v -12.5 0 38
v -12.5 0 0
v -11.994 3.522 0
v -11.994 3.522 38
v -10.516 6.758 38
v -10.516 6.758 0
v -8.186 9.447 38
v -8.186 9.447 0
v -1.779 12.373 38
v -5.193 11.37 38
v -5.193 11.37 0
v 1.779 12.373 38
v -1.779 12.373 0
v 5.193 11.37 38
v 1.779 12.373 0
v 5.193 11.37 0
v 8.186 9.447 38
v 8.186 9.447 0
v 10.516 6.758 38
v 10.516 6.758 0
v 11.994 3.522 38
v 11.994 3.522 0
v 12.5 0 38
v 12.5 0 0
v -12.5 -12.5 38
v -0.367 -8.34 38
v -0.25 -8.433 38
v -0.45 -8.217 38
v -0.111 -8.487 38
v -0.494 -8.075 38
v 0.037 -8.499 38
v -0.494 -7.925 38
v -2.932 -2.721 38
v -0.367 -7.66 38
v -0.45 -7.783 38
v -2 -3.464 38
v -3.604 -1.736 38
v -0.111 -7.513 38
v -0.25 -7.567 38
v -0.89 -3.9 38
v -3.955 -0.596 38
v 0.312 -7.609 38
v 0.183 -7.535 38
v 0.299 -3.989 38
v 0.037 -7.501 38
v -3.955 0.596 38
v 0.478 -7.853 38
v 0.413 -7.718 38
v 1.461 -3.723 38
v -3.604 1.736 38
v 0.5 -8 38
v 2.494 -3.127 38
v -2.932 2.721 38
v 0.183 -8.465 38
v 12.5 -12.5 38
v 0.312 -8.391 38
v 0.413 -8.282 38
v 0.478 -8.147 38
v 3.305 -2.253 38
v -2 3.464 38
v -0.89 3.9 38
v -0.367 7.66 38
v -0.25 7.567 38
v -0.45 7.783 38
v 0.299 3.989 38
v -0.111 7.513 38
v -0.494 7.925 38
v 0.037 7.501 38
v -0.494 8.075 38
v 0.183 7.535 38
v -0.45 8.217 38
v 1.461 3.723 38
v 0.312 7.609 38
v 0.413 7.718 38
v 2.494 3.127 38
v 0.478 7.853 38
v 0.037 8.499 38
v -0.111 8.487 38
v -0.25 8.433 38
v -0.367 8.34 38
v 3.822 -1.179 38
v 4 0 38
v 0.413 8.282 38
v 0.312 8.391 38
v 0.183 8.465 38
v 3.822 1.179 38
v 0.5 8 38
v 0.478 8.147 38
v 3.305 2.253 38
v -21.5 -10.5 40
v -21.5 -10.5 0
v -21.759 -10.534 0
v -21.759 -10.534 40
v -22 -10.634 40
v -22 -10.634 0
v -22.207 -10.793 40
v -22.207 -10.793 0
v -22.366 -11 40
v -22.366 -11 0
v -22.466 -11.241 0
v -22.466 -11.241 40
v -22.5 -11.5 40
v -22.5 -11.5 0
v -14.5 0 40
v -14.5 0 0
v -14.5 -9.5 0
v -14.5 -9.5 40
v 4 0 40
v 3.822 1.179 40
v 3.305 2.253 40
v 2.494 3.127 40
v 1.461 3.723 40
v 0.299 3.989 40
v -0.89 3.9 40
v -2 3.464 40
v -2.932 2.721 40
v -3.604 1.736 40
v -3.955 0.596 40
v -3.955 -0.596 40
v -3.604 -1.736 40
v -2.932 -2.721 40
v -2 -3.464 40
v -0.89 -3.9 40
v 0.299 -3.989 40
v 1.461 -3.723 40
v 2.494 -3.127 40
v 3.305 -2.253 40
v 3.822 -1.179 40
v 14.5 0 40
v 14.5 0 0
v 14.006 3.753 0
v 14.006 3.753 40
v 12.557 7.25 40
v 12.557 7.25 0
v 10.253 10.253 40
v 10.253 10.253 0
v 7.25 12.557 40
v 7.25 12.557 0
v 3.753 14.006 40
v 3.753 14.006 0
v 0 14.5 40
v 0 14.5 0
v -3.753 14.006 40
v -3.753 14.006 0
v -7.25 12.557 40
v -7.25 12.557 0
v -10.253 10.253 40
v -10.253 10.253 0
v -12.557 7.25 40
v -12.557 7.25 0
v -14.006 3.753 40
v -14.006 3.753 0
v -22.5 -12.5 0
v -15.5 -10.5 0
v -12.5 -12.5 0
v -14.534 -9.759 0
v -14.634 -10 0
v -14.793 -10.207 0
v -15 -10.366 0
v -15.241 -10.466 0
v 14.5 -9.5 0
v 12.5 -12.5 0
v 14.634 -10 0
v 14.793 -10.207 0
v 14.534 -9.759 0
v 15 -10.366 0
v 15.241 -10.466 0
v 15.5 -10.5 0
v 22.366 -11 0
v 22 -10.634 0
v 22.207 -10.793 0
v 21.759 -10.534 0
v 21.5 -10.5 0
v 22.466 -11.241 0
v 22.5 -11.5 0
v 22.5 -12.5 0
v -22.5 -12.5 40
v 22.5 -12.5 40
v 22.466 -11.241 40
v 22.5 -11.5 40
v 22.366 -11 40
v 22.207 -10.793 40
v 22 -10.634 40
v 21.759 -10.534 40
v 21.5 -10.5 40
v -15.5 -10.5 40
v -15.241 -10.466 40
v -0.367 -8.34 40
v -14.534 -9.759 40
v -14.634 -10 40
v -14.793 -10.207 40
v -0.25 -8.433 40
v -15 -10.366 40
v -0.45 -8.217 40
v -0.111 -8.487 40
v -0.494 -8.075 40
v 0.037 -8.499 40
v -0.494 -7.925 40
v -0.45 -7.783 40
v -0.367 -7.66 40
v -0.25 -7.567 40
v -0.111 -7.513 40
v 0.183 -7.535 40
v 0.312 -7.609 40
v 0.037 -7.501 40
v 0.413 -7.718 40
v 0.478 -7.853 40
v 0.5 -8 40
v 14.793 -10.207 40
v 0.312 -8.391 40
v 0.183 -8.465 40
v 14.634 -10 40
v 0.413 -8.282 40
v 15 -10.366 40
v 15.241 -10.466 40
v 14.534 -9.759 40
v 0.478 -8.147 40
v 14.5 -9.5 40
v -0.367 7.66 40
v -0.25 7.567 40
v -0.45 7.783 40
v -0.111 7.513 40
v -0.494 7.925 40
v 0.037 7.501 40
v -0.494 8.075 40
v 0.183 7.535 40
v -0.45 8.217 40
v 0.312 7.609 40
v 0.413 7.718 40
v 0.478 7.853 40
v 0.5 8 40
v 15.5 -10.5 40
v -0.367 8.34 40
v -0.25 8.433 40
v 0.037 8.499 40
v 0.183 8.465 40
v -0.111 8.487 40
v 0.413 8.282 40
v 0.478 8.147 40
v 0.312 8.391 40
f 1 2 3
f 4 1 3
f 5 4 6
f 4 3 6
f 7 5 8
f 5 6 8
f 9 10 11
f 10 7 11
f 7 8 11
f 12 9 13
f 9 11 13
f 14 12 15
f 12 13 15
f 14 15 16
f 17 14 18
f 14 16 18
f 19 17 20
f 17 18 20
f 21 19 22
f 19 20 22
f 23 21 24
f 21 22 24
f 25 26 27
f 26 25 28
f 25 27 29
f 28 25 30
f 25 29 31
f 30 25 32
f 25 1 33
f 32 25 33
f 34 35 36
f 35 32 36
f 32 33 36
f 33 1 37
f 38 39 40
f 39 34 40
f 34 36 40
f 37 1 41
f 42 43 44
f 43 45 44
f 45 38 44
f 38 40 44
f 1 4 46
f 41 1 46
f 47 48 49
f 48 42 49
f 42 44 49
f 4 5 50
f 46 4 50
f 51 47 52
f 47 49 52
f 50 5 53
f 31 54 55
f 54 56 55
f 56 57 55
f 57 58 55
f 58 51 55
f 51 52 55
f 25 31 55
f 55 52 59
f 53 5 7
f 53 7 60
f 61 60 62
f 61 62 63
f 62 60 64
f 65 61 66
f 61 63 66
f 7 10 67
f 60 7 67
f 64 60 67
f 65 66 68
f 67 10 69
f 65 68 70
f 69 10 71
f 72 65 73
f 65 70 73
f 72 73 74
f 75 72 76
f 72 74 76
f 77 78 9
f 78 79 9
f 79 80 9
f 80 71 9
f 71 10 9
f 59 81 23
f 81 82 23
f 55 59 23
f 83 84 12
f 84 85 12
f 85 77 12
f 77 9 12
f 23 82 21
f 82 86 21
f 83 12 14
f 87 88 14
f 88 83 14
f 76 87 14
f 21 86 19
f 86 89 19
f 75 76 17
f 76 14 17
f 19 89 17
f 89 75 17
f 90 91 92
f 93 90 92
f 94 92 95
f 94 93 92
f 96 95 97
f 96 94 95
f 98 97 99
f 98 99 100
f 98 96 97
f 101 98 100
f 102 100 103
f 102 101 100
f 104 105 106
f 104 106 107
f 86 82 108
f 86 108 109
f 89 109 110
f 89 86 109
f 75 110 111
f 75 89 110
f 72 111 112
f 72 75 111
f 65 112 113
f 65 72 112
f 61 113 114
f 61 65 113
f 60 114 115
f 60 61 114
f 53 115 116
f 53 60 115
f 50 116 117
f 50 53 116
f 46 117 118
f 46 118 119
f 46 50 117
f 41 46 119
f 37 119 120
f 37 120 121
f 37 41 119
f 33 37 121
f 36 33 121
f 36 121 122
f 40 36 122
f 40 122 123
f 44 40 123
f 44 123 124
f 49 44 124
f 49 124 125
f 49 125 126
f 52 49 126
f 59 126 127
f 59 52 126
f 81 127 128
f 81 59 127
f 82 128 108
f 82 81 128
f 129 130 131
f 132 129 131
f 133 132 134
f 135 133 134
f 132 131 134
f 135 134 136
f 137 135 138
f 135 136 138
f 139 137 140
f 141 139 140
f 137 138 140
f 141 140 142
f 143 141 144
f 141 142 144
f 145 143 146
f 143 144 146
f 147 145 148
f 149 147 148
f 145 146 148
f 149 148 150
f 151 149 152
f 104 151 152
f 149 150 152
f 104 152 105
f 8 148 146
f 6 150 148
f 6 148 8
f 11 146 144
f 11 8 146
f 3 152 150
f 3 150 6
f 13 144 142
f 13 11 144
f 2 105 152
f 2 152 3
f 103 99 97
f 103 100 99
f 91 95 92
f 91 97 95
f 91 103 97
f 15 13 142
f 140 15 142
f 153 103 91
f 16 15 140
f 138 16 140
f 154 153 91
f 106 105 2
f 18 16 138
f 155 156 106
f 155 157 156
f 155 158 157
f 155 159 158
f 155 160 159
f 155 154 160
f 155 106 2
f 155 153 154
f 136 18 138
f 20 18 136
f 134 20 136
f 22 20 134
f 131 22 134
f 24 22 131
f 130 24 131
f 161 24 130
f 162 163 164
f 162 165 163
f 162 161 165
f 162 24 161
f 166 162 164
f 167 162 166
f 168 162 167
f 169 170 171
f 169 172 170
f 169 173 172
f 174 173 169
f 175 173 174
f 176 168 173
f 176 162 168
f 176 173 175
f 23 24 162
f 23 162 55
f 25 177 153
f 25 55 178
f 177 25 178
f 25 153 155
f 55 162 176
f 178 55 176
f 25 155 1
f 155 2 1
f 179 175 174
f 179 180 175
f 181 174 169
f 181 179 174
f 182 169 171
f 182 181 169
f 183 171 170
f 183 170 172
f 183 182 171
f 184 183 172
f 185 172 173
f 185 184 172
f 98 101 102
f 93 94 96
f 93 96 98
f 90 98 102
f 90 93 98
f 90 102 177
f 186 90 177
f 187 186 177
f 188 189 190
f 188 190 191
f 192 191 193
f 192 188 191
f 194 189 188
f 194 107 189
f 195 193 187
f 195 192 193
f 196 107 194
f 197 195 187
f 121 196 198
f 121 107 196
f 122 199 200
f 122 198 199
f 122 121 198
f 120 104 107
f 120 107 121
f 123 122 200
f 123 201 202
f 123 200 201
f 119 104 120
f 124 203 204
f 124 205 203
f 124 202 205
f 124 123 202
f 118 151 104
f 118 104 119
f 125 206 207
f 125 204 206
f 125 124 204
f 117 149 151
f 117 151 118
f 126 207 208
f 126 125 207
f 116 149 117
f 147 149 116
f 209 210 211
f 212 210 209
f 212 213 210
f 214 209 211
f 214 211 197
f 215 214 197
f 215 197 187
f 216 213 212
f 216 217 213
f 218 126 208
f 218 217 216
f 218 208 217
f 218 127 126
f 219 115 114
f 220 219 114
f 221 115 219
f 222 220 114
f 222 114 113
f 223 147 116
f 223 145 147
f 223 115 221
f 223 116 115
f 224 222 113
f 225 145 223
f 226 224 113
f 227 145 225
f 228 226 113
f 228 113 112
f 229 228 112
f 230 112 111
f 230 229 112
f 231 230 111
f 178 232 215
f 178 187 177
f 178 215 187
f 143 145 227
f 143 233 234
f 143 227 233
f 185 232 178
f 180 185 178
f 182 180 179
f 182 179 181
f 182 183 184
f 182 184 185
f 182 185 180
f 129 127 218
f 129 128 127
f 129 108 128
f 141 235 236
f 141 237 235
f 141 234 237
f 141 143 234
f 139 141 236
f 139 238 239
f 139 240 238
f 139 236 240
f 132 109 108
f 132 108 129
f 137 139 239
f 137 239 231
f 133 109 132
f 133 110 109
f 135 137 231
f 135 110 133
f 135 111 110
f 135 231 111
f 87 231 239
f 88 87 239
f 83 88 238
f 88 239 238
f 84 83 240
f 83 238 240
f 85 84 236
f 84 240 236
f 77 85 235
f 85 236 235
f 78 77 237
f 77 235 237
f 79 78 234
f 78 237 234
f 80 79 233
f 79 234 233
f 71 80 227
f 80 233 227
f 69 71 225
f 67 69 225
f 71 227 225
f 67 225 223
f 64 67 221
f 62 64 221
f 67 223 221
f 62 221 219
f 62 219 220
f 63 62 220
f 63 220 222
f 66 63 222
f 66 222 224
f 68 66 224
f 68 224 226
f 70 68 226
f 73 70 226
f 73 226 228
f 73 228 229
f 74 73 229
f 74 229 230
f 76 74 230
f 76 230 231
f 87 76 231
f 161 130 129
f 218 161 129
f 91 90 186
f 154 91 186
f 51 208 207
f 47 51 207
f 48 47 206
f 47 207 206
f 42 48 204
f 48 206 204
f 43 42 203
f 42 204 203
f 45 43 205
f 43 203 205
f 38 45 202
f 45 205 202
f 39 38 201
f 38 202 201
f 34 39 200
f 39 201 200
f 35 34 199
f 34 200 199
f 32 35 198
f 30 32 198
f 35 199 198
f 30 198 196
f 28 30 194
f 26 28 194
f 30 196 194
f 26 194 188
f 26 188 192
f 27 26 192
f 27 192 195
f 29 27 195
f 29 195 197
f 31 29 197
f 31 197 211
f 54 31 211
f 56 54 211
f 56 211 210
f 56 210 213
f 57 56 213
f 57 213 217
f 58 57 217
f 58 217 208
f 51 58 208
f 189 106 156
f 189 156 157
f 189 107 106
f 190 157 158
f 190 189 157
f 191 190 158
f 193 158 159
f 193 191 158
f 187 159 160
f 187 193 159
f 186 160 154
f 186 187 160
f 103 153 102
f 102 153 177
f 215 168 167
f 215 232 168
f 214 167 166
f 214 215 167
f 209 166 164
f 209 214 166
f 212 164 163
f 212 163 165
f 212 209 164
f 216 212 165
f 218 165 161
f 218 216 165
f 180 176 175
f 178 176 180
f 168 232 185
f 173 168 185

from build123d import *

# Parameters (mm, degrees)
BOSS_EXTRU_1_DEPTH      = 40
ESQUISSE2_W             = 2
ESQUISSE2_H             = 40
BOSS_EXTRU_2_DEPTH      = 12.5
ESQUISSE3_W             = 10
ESQUISSE3_H             = 40
BOSS_EXTRU_3_DEPTH      = 2
BOSS_EXTRU_4_START      = -2
ESQUISSE4_R             = 4
BOSS_EXTRU_4_DEPTH      = 2
CONG_1_R                = 1
ESQUISSE5_R             = 0.5
ENL_V_MAT_EXTRU_1_DEPTH = 49.130032204


with BuildPart() as part:
    # Esquisse1 → Boss.-Extru.1 (new body)
    with BuildSketch(Plane.XY):
        with BuildLine():
            ThreePointArc((-12.5, 0), (0, 12.5), (12.5, 0))
            Line((12.5, 0), (14.5, 0))
            ThreePointArc((14.5, 0), (0, 14.5), (-14.5, 0))
            Line((-14.5, 0), (-12.5, 0))
        make_face()
    extrude(amount=BOSS_EXTRU_1_DEPTH)

    # Esquisse2 → Boss.-Extru.2 (add)
    with BuildSketch(Plane.XZ):
        with Locations((-13.5, 20)):
            Rectangle(ESQUISSE2_W, ESQUISSE2_H)
        with Locations((13.5, 20)):
            Rectangle(ESQUISSE2_W, ESQUISSE2_H)
    extrude(amount=BOSS_EXTRU_2_DEPTH)

    # Esquisse3 → Boss.-Extru.3 (add)
    with BuildSketch(Plane.XZ.offset(12.5)):
        with Locations((-17.5, 20)):
            Rectangle(ESQUISSE3_W, ESQUISSE3_H)
        with Locations((17.5, 20)):
            Rectangle(ESQUISSE3_W, ESQUISSE3_H)
    extrude(amount=-BOSS_EXTRU_3_DEPTH)

    # Esquisse4 → Boss.-Extru.4 (add)
    with BuildSketch(Plane.XY.offset(40).offset(BOSS_EXTRU_4_START)):
        with BuildLine():
            Line((-12.5, 0), (-12.5, -12.5))
            Line((-12.5, -12.5), (12.5, -12.5))
            Line((12.5, -12.5), (12.5, 0))
            ThreePointArc((12.5, 0), (0, 12.5), (-12.5, 0))
        make_face()
        Circle(ESQUISSE4_R, mode=Mode.SUBTRACT)
    extrude(amount=BOSS_EXTRU_4_DEPTH)

    # Congé1
    cong_1_edges = [part.edges().sort_by_distance(p)[0] for p in [
        (-22.5, -10.5, 20),
        (-14.5, -10.5, 20),
        (14.5, -10.5, 20),
        (22.5, -10.5, 20),
    ]]
    fillet(cong_1_edges, radius=CONG_1_R)

    # Esquisse5 → Enlèv. mat.-Extru.1 (cut, through all)
    with BuildSketch(Plane.XY.offset(40)):
        with Locations((0, -8)):
            Circle(ESQUISSE5_R)
        with Locations((0, 8)):
            Circle(ESQUISSE5_R)
    extrude(amount=-ENL_V_MAT_EXTRU_1_DEPTH, mode=Mode.SUBTRACT)


solid = part.part
